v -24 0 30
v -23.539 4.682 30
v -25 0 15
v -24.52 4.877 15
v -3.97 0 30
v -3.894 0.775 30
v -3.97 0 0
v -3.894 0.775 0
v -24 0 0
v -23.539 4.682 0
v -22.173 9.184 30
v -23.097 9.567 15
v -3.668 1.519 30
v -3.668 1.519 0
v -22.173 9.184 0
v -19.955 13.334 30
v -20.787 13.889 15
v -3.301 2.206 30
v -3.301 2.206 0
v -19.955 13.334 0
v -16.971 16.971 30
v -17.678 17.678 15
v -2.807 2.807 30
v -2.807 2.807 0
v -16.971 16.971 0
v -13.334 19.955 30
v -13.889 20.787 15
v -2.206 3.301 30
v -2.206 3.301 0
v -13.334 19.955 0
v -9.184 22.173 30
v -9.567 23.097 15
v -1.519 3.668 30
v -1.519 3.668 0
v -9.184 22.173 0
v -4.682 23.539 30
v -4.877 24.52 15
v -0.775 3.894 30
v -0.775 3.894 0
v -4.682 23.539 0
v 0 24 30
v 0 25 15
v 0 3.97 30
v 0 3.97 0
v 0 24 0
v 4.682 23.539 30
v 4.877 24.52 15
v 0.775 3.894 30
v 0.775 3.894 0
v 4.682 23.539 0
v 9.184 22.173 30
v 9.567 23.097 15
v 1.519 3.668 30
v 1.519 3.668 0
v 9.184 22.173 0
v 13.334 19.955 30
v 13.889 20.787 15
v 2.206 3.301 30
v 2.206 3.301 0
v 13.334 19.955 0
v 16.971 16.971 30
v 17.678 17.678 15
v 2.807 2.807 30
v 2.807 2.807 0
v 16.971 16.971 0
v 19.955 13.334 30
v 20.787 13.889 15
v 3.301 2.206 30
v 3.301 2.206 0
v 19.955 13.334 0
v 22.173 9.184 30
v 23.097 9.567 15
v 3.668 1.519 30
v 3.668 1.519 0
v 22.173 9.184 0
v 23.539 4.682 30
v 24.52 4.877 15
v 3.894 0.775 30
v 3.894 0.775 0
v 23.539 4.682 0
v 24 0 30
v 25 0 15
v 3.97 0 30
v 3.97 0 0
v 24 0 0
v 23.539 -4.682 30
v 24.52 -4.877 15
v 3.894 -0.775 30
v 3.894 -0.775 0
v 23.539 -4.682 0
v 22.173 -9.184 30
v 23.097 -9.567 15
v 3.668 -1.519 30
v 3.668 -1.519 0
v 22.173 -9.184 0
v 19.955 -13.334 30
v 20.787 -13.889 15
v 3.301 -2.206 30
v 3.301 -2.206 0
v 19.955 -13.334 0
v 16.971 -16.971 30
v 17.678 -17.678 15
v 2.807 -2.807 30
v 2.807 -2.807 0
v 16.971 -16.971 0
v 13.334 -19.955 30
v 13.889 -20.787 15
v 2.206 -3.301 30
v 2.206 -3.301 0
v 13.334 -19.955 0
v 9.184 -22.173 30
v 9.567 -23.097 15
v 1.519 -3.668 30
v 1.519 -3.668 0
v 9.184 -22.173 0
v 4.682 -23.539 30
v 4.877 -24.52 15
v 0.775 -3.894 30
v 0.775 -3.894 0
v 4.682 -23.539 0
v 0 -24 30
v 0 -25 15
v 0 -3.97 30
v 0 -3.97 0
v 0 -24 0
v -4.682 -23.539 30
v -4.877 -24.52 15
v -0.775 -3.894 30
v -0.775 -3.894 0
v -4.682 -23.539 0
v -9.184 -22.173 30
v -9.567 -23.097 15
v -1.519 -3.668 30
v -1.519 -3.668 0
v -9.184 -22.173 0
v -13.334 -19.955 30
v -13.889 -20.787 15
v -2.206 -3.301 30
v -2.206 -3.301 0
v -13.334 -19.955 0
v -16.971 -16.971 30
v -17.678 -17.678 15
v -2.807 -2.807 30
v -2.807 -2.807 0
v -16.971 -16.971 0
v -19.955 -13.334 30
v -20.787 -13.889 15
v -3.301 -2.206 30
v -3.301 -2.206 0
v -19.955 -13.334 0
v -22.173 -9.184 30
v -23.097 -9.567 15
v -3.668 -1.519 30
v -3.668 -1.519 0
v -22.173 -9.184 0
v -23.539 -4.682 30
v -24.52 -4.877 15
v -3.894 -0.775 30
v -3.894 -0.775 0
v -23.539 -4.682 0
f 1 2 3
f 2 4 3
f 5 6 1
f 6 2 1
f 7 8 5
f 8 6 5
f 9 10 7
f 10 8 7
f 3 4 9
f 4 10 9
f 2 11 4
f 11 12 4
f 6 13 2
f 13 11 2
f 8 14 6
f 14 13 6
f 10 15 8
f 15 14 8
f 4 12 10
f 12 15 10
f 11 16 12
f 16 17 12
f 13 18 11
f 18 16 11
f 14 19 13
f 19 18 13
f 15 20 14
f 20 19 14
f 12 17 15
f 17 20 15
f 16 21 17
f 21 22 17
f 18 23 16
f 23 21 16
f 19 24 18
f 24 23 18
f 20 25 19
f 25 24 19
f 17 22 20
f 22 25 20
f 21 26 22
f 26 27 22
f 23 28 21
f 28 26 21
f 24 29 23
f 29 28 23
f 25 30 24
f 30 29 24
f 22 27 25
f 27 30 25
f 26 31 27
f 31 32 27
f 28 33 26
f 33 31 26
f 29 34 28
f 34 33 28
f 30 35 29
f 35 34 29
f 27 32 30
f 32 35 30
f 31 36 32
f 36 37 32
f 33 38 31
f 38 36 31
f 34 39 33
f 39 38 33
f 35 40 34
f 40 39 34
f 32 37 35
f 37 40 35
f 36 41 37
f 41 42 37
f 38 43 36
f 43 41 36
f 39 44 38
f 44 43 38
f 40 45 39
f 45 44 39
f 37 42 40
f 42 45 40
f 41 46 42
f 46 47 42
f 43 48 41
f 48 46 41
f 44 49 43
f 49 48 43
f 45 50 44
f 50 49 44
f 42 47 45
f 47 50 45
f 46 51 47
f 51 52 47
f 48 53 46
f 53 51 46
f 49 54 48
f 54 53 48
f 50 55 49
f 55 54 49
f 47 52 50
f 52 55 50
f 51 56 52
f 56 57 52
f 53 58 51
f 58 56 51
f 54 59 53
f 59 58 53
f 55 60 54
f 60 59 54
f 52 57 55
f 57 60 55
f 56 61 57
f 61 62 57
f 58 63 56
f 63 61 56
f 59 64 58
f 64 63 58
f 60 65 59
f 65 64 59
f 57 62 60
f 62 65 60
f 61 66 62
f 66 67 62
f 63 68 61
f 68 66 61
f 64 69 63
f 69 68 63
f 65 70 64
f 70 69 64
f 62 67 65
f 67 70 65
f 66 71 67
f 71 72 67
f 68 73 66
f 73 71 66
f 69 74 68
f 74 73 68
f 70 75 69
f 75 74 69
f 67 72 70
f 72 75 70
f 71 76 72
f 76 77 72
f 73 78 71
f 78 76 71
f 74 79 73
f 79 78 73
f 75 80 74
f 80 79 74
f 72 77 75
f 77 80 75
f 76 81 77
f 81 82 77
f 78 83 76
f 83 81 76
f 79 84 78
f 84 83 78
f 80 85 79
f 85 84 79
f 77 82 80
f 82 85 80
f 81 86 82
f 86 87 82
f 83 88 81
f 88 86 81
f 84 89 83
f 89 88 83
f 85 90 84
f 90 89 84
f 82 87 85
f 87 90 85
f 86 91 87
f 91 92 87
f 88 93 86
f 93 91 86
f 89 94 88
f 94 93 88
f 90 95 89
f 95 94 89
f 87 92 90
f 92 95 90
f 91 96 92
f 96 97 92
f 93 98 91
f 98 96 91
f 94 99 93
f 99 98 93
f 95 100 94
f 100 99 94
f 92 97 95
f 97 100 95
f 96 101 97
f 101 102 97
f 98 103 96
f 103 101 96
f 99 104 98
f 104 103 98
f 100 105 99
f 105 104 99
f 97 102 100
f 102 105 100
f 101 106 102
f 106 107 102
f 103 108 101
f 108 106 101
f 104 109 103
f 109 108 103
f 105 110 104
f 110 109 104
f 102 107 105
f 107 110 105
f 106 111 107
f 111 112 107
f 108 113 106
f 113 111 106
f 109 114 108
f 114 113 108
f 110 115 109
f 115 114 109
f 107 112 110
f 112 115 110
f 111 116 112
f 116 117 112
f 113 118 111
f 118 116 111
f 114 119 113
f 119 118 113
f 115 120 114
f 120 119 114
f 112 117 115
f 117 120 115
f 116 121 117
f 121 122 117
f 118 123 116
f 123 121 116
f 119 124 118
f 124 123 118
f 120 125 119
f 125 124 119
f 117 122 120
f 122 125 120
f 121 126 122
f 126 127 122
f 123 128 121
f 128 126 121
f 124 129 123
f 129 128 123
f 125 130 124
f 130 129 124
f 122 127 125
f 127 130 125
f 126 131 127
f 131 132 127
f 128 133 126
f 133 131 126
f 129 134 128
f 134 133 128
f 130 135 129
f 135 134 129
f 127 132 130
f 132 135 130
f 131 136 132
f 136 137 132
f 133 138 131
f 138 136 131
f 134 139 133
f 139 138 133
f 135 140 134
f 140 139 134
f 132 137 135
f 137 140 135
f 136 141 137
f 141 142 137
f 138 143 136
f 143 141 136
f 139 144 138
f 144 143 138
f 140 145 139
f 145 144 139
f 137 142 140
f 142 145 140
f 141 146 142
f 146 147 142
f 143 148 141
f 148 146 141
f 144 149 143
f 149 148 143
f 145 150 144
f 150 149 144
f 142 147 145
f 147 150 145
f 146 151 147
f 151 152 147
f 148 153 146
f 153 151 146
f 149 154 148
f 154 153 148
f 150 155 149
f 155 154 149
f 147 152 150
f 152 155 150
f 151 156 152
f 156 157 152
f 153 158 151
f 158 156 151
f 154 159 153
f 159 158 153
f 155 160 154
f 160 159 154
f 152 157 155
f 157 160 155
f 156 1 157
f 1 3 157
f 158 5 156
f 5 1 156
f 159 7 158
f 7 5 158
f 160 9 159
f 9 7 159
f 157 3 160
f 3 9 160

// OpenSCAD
$fn = 32;

// ----------------------------------------------------------------------
// Belt roller: 48 mm barrel, 30 mm wide, bore 7.94 mm
// ----------------------------------------------------------------------

// --- parameters (mm) ---
bore_d = 7.94;            // bore
barrel_d = 48;            // barrel diameter
roller_w = 30;            // roller width
crown = 1;                // crown height at mid width

roller_profile = [[3.97, 0], [24, 0], [25, 15], [24, 30], [3.97, 30]];

/* the profile stays clear of the axis, so the bore comes out of the revolve */
rotate_extrude() polygon(roller_profile);
